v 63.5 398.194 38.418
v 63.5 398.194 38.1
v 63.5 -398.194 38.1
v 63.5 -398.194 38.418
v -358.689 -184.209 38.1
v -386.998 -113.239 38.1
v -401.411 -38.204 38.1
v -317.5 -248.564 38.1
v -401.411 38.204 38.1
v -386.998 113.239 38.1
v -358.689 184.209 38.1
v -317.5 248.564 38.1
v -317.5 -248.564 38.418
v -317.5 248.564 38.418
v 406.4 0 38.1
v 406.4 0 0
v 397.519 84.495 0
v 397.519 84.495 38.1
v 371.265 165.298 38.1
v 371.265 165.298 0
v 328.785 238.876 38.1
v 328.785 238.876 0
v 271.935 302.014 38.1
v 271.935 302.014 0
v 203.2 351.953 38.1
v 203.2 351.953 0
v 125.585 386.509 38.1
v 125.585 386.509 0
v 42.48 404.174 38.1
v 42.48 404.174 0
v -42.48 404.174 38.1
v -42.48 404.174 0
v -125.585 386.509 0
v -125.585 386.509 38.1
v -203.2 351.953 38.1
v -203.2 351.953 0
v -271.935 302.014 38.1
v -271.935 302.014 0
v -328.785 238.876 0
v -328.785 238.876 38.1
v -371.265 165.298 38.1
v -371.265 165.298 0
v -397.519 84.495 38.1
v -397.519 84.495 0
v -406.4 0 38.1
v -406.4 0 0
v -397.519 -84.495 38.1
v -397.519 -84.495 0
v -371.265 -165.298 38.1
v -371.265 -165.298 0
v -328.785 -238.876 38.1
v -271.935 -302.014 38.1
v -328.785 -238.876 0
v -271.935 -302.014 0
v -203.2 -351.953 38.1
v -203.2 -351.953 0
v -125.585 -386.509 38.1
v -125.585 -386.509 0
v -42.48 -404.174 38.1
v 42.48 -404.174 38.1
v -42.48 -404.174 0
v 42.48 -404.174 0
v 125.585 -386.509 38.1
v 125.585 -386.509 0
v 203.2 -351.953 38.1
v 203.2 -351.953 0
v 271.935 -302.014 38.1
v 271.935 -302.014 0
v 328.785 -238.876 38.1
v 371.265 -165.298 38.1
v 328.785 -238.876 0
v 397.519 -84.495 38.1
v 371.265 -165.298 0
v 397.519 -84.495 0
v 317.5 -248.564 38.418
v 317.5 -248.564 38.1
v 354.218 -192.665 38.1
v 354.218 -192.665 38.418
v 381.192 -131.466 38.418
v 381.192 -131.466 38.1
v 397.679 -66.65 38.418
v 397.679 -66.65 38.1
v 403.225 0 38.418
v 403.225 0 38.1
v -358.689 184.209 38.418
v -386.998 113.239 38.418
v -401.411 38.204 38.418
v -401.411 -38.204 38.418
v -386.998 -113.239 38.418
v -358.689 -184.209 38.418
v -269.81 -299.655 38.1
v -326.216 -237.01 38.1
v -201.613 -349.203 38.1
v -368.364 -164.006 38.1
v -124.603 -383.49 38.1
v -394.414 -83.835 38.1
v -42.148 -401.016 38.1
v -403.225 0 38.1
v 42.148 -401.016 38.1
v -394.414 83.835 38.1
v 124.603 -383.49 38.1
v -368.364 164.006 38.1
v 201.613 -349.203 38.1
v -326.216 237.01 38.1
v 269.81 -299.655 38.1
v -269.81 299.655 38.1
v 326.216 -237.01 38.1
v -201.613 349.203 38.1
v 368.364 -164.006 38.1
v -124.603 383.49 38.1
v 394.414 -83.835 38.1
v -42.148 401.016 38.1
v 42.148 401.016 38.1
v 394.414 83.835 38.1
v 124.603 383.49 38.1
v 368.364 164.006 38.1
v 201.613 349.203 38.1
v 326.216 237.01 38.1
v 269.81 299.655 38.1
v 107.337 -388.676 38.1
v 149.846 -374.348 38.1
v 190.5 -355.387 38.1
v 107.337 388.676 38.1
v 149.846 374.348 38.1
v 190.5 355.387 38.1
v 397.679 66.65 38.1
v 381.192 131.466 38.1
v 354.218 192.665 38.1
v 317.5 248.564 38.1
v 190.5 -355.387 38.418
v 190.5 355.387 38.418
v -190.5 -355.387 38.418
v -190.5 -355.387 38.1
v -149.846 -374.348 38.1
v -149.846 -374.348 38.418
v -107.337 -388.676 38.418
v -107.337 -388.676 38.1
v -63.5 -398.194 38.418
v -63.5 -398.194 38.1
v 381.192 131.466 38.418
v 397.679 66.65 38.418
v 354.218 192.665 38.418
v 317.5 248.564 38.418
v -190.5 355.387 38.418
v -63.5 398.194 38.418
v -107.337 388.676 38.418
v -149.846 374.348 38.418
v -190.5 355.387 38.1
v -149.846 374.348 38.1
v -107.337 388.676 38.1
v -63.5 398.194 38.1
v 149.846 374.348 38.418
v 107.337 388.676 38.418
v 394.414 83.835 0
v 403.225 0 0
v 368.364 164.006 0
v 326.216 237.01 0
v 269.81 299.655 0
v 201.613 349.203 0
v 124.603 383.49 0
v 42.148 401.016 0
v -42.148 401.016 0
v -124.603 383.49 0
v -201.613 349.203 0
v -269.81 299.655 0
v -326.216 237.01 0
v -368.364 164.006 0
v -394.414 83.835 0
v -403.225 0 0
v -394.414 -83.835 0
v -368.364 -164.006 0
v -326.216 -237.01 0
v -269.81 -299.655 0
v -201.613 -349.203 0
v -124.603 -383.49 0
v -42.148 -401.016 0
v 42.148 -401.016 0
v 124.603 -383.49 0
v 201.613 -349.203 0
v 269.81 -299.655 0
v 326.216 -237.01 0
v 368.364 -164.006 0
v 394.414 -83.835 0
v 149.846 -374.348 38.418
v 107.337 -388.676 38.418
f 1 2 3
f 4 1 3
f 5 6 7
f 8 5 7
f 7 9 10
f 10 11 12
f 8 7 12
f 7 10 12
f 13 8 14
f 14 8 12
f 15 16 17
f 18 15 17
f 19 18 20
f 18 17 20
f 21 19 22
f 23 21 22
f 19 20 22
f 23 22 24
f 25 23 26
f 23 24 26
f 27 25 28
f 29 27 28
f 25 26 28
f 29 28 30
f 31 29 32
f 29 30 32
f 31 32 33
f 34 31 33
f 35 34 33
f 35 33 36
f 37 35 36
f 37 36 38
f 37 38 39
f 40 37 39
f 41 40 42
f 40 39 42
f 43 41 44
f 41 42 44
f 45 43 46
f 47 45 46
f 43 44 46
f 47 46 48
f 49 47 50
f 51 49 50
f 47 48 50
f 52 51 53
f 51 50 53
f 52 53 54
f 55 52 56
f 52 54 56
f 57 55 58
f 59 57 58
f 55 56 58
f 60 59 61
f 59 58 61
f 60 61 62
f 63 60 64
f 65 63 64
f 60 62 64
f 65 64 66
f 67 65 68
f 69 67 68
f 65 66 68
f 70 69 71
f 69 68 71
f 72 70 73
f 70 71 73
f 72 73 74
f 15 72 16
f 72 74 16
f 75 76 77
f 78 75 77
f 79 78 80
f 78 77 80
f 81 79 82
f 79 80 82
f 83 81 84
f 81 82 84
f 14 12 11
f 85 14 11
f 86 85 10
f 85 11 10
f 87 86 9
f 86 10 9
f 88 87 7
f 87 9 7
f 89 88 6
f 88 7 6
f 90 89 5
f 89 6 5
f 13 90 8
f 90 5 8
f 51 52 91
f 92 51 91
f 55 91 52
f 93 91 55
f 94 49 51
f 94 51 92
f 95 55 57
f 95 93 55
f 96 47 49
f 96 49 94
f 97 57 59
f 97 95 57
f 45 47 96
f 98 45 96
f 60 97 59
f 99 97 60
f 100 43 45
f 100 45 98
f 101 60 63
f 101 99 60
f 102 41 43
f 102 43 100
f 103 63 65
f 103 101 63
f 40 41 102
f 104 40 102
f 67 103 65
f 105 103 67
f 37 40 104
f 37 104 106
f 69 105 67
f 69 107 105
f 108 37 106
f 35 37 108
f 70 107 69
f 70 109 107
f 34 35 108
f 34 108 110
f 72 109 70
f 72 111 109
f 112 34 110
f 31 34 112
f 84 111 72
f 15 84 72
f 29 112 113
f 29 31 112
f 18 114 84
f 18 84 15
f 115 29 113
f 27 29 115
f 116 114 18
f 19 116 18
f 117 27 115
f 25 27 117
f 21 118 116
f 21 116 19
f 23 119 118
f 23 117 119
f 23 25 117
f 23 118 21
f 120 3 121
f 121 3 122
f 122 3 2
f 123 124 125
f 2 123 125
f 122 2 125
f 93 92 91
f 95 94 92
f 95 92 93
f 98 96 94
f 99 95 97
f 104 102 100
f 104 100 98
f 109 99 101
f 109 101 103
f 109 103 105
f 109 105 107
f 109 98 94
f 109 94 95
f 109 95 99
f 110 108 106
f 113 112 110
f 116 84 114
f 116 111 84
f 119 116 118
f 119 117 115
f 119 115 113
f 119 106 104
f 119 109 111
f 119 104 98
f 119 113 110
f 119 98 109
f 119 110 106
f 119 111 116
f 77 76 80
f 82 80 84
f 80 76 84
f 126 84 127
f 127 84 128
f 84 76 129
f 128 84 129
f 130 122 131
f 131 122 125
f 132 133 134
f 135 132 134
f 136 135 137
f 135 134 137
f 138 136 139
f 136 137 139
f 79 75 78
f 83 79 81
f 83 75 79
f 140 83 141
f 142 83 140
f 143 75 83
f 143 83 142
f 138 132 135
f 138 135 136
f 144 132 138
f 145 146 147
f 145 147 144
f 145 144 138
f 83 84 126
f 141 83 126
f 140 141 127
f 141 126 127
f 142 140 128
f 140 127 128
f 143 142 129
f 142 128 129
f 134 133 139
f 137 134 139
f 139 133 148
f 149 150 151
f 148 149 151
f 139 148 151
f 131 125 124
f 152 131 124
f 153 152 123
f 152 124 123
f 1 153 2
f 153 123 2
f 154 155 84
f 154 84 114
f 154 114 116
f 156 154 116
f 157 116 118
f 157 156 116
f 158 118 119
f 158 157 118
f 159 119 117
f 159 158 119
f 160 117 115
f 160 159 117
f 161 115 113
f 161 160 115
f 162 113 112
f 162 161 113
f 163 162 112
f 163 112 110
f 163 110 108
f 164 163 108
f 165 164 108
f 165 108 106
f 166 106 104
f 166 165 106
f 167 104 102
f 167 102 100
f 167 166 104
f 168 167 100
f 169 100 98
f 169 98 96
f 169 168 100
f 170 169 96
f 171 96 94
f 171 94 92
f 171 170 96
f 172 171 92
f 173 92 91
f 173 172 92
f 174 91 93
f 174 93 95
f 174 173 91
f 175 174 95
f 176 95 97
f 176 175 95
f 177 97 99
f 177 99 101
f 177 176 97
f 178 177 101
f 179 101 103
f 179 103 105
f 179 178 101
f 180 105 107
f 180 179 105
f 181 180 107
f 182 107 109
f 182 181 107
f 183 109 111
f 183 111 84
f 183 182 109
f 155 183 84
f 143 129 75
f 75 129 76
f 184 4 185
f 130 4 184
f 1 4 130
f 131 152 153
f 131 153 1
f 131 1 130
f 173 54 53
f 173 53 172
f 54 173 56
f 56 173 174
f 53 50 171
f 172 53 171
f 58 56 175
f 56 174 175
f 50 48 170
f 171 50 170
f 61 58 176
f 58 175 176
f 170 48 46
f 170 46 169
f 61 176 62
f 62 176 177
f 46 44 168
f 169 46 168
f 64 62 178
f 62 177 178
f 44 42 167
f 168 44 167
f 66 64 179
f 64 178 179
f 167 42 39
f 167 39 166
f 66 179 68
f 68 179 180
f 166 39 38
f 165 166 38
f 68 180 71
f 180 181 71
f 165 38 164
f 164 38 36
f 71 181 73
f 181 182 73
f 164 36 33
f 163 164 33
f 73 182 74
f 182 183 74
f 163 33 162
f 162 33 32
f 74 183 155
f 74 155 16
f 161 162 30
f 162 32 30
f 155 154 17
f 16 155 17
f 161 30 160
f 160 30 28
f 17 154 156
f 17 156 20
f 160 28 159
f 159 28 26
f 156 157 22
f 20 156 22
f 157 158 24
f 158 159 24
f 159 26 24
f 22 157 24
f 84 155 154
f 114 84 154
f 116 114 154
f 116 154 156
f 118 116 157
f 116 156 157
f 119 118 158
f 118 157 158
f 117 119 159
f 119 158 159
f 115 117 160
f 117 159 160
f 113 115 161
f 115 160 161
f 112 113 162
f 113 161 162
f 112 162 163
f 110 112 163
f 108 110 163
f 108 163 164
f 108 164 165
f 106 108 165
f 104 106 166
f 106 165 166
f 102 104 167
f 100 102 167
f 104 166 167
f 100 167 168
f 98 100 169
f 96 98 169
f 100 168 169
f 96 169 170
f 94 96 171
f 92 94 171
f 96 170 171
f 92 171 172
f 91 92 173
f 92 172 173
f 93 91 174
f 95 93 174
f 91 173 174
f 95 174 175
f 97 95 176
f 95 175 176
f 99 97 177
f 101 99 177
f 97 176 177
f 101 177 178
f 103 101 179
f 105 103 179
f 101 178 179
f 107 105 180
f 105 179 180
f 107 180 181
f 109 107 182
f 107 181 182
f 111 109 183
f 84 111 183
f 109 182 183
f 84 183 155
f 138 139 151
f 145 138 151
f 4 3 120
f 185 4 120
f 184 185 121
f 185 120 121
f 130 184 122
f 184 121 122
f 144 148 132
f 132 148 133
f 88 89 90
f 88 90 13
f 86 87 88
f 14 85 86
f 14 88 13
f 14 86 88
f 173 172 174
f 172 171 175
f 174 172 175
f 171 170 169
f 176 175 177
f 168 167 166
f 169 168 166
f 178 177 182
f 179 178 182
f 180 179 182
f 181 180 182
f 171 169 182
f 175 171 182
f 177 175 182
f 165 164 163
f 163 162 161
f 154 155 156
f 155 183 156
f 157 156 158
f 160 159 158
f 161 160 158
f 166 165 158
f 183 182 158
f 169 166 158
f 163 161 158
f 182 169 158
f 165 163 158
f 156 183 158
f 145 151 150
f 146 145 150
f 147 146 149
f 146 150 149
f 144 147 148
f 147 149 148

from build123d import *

# Parameters (mm, degrees)
F0_R     = 403.225
F1_DEPTH = 38.1
F0_R_2   = 406.4
F2_DEPTH = 38.1
F4_DEPTH = 0.3175


with BuildPart() as f1:
    # F0 (on Top) → F1 (new body)
    with BuildSketch(Plane.XY):
        Circle(F0_R)
    extrude(amount=F1_DEPTH)


with BuildPart() as f2:
    # F0 (on Top) → F2 (new body)
    with BuildSketch(Plane.XY):
        Circle(F0_R_2)
        Circle(F0_R, mode=Mode.SUBTRACT)
    extrude(amount=F2_DEPTH)


with BuildPart() as f4:
    # F3 (on face) → F4 (new body)
    with BuildSketch(Plane.XY.offset(38.1)):
        with BuildLine():
            ThreePointArc((-317.5, 248.564178), (-403.225, 0), (-317.5, -248.564178))
            Line((-317.5, -248.564178), (-317.5, 248.564178))
        make_face()
        with BuildLine():
            ThreePointArc((-190.5, -355.387325), (-128.790894, -382.10379), (-63.5, -398.193609))
            Line((-63.5, -398.193609), (-63.5, 398.193609))
            ThreePointArc((-63.5, 398.193609), (-128.790894, 382.10379), (-190.5, 355.387325))
            Line((-190.5, 355.387325), (-190.5, -355.387325))
        make_face()
        with BuildLine():
            Line((63.5, 398.193609), (63.5, -398.193609))
            ThreePointArc((63.5, -398.193609), (128.790894, -382.10379), (190.5, -355.387325))
            Line((190.5, -355.387325), (190.5, 355.387325))
            ThreePointArc((190.5, 355.387325), (128.790894, 382.10379), (63.5, 398.193609))
        make_face()
        with BuildLine():
            Line((317.5, 248.564178), (317.5, -248.564178))
            ThreePointArc((317.5, -248.564178), (381.191775, -131.465705), (403.225, 0))
            ThreePointArc((403.225, 0), (381.191775, 131.465705), (317.5, 248.564178))
        make_face()
    extrude(amount=F4_DEPTH)


solid = Compound([f1.part, f2.part, f4.part])
